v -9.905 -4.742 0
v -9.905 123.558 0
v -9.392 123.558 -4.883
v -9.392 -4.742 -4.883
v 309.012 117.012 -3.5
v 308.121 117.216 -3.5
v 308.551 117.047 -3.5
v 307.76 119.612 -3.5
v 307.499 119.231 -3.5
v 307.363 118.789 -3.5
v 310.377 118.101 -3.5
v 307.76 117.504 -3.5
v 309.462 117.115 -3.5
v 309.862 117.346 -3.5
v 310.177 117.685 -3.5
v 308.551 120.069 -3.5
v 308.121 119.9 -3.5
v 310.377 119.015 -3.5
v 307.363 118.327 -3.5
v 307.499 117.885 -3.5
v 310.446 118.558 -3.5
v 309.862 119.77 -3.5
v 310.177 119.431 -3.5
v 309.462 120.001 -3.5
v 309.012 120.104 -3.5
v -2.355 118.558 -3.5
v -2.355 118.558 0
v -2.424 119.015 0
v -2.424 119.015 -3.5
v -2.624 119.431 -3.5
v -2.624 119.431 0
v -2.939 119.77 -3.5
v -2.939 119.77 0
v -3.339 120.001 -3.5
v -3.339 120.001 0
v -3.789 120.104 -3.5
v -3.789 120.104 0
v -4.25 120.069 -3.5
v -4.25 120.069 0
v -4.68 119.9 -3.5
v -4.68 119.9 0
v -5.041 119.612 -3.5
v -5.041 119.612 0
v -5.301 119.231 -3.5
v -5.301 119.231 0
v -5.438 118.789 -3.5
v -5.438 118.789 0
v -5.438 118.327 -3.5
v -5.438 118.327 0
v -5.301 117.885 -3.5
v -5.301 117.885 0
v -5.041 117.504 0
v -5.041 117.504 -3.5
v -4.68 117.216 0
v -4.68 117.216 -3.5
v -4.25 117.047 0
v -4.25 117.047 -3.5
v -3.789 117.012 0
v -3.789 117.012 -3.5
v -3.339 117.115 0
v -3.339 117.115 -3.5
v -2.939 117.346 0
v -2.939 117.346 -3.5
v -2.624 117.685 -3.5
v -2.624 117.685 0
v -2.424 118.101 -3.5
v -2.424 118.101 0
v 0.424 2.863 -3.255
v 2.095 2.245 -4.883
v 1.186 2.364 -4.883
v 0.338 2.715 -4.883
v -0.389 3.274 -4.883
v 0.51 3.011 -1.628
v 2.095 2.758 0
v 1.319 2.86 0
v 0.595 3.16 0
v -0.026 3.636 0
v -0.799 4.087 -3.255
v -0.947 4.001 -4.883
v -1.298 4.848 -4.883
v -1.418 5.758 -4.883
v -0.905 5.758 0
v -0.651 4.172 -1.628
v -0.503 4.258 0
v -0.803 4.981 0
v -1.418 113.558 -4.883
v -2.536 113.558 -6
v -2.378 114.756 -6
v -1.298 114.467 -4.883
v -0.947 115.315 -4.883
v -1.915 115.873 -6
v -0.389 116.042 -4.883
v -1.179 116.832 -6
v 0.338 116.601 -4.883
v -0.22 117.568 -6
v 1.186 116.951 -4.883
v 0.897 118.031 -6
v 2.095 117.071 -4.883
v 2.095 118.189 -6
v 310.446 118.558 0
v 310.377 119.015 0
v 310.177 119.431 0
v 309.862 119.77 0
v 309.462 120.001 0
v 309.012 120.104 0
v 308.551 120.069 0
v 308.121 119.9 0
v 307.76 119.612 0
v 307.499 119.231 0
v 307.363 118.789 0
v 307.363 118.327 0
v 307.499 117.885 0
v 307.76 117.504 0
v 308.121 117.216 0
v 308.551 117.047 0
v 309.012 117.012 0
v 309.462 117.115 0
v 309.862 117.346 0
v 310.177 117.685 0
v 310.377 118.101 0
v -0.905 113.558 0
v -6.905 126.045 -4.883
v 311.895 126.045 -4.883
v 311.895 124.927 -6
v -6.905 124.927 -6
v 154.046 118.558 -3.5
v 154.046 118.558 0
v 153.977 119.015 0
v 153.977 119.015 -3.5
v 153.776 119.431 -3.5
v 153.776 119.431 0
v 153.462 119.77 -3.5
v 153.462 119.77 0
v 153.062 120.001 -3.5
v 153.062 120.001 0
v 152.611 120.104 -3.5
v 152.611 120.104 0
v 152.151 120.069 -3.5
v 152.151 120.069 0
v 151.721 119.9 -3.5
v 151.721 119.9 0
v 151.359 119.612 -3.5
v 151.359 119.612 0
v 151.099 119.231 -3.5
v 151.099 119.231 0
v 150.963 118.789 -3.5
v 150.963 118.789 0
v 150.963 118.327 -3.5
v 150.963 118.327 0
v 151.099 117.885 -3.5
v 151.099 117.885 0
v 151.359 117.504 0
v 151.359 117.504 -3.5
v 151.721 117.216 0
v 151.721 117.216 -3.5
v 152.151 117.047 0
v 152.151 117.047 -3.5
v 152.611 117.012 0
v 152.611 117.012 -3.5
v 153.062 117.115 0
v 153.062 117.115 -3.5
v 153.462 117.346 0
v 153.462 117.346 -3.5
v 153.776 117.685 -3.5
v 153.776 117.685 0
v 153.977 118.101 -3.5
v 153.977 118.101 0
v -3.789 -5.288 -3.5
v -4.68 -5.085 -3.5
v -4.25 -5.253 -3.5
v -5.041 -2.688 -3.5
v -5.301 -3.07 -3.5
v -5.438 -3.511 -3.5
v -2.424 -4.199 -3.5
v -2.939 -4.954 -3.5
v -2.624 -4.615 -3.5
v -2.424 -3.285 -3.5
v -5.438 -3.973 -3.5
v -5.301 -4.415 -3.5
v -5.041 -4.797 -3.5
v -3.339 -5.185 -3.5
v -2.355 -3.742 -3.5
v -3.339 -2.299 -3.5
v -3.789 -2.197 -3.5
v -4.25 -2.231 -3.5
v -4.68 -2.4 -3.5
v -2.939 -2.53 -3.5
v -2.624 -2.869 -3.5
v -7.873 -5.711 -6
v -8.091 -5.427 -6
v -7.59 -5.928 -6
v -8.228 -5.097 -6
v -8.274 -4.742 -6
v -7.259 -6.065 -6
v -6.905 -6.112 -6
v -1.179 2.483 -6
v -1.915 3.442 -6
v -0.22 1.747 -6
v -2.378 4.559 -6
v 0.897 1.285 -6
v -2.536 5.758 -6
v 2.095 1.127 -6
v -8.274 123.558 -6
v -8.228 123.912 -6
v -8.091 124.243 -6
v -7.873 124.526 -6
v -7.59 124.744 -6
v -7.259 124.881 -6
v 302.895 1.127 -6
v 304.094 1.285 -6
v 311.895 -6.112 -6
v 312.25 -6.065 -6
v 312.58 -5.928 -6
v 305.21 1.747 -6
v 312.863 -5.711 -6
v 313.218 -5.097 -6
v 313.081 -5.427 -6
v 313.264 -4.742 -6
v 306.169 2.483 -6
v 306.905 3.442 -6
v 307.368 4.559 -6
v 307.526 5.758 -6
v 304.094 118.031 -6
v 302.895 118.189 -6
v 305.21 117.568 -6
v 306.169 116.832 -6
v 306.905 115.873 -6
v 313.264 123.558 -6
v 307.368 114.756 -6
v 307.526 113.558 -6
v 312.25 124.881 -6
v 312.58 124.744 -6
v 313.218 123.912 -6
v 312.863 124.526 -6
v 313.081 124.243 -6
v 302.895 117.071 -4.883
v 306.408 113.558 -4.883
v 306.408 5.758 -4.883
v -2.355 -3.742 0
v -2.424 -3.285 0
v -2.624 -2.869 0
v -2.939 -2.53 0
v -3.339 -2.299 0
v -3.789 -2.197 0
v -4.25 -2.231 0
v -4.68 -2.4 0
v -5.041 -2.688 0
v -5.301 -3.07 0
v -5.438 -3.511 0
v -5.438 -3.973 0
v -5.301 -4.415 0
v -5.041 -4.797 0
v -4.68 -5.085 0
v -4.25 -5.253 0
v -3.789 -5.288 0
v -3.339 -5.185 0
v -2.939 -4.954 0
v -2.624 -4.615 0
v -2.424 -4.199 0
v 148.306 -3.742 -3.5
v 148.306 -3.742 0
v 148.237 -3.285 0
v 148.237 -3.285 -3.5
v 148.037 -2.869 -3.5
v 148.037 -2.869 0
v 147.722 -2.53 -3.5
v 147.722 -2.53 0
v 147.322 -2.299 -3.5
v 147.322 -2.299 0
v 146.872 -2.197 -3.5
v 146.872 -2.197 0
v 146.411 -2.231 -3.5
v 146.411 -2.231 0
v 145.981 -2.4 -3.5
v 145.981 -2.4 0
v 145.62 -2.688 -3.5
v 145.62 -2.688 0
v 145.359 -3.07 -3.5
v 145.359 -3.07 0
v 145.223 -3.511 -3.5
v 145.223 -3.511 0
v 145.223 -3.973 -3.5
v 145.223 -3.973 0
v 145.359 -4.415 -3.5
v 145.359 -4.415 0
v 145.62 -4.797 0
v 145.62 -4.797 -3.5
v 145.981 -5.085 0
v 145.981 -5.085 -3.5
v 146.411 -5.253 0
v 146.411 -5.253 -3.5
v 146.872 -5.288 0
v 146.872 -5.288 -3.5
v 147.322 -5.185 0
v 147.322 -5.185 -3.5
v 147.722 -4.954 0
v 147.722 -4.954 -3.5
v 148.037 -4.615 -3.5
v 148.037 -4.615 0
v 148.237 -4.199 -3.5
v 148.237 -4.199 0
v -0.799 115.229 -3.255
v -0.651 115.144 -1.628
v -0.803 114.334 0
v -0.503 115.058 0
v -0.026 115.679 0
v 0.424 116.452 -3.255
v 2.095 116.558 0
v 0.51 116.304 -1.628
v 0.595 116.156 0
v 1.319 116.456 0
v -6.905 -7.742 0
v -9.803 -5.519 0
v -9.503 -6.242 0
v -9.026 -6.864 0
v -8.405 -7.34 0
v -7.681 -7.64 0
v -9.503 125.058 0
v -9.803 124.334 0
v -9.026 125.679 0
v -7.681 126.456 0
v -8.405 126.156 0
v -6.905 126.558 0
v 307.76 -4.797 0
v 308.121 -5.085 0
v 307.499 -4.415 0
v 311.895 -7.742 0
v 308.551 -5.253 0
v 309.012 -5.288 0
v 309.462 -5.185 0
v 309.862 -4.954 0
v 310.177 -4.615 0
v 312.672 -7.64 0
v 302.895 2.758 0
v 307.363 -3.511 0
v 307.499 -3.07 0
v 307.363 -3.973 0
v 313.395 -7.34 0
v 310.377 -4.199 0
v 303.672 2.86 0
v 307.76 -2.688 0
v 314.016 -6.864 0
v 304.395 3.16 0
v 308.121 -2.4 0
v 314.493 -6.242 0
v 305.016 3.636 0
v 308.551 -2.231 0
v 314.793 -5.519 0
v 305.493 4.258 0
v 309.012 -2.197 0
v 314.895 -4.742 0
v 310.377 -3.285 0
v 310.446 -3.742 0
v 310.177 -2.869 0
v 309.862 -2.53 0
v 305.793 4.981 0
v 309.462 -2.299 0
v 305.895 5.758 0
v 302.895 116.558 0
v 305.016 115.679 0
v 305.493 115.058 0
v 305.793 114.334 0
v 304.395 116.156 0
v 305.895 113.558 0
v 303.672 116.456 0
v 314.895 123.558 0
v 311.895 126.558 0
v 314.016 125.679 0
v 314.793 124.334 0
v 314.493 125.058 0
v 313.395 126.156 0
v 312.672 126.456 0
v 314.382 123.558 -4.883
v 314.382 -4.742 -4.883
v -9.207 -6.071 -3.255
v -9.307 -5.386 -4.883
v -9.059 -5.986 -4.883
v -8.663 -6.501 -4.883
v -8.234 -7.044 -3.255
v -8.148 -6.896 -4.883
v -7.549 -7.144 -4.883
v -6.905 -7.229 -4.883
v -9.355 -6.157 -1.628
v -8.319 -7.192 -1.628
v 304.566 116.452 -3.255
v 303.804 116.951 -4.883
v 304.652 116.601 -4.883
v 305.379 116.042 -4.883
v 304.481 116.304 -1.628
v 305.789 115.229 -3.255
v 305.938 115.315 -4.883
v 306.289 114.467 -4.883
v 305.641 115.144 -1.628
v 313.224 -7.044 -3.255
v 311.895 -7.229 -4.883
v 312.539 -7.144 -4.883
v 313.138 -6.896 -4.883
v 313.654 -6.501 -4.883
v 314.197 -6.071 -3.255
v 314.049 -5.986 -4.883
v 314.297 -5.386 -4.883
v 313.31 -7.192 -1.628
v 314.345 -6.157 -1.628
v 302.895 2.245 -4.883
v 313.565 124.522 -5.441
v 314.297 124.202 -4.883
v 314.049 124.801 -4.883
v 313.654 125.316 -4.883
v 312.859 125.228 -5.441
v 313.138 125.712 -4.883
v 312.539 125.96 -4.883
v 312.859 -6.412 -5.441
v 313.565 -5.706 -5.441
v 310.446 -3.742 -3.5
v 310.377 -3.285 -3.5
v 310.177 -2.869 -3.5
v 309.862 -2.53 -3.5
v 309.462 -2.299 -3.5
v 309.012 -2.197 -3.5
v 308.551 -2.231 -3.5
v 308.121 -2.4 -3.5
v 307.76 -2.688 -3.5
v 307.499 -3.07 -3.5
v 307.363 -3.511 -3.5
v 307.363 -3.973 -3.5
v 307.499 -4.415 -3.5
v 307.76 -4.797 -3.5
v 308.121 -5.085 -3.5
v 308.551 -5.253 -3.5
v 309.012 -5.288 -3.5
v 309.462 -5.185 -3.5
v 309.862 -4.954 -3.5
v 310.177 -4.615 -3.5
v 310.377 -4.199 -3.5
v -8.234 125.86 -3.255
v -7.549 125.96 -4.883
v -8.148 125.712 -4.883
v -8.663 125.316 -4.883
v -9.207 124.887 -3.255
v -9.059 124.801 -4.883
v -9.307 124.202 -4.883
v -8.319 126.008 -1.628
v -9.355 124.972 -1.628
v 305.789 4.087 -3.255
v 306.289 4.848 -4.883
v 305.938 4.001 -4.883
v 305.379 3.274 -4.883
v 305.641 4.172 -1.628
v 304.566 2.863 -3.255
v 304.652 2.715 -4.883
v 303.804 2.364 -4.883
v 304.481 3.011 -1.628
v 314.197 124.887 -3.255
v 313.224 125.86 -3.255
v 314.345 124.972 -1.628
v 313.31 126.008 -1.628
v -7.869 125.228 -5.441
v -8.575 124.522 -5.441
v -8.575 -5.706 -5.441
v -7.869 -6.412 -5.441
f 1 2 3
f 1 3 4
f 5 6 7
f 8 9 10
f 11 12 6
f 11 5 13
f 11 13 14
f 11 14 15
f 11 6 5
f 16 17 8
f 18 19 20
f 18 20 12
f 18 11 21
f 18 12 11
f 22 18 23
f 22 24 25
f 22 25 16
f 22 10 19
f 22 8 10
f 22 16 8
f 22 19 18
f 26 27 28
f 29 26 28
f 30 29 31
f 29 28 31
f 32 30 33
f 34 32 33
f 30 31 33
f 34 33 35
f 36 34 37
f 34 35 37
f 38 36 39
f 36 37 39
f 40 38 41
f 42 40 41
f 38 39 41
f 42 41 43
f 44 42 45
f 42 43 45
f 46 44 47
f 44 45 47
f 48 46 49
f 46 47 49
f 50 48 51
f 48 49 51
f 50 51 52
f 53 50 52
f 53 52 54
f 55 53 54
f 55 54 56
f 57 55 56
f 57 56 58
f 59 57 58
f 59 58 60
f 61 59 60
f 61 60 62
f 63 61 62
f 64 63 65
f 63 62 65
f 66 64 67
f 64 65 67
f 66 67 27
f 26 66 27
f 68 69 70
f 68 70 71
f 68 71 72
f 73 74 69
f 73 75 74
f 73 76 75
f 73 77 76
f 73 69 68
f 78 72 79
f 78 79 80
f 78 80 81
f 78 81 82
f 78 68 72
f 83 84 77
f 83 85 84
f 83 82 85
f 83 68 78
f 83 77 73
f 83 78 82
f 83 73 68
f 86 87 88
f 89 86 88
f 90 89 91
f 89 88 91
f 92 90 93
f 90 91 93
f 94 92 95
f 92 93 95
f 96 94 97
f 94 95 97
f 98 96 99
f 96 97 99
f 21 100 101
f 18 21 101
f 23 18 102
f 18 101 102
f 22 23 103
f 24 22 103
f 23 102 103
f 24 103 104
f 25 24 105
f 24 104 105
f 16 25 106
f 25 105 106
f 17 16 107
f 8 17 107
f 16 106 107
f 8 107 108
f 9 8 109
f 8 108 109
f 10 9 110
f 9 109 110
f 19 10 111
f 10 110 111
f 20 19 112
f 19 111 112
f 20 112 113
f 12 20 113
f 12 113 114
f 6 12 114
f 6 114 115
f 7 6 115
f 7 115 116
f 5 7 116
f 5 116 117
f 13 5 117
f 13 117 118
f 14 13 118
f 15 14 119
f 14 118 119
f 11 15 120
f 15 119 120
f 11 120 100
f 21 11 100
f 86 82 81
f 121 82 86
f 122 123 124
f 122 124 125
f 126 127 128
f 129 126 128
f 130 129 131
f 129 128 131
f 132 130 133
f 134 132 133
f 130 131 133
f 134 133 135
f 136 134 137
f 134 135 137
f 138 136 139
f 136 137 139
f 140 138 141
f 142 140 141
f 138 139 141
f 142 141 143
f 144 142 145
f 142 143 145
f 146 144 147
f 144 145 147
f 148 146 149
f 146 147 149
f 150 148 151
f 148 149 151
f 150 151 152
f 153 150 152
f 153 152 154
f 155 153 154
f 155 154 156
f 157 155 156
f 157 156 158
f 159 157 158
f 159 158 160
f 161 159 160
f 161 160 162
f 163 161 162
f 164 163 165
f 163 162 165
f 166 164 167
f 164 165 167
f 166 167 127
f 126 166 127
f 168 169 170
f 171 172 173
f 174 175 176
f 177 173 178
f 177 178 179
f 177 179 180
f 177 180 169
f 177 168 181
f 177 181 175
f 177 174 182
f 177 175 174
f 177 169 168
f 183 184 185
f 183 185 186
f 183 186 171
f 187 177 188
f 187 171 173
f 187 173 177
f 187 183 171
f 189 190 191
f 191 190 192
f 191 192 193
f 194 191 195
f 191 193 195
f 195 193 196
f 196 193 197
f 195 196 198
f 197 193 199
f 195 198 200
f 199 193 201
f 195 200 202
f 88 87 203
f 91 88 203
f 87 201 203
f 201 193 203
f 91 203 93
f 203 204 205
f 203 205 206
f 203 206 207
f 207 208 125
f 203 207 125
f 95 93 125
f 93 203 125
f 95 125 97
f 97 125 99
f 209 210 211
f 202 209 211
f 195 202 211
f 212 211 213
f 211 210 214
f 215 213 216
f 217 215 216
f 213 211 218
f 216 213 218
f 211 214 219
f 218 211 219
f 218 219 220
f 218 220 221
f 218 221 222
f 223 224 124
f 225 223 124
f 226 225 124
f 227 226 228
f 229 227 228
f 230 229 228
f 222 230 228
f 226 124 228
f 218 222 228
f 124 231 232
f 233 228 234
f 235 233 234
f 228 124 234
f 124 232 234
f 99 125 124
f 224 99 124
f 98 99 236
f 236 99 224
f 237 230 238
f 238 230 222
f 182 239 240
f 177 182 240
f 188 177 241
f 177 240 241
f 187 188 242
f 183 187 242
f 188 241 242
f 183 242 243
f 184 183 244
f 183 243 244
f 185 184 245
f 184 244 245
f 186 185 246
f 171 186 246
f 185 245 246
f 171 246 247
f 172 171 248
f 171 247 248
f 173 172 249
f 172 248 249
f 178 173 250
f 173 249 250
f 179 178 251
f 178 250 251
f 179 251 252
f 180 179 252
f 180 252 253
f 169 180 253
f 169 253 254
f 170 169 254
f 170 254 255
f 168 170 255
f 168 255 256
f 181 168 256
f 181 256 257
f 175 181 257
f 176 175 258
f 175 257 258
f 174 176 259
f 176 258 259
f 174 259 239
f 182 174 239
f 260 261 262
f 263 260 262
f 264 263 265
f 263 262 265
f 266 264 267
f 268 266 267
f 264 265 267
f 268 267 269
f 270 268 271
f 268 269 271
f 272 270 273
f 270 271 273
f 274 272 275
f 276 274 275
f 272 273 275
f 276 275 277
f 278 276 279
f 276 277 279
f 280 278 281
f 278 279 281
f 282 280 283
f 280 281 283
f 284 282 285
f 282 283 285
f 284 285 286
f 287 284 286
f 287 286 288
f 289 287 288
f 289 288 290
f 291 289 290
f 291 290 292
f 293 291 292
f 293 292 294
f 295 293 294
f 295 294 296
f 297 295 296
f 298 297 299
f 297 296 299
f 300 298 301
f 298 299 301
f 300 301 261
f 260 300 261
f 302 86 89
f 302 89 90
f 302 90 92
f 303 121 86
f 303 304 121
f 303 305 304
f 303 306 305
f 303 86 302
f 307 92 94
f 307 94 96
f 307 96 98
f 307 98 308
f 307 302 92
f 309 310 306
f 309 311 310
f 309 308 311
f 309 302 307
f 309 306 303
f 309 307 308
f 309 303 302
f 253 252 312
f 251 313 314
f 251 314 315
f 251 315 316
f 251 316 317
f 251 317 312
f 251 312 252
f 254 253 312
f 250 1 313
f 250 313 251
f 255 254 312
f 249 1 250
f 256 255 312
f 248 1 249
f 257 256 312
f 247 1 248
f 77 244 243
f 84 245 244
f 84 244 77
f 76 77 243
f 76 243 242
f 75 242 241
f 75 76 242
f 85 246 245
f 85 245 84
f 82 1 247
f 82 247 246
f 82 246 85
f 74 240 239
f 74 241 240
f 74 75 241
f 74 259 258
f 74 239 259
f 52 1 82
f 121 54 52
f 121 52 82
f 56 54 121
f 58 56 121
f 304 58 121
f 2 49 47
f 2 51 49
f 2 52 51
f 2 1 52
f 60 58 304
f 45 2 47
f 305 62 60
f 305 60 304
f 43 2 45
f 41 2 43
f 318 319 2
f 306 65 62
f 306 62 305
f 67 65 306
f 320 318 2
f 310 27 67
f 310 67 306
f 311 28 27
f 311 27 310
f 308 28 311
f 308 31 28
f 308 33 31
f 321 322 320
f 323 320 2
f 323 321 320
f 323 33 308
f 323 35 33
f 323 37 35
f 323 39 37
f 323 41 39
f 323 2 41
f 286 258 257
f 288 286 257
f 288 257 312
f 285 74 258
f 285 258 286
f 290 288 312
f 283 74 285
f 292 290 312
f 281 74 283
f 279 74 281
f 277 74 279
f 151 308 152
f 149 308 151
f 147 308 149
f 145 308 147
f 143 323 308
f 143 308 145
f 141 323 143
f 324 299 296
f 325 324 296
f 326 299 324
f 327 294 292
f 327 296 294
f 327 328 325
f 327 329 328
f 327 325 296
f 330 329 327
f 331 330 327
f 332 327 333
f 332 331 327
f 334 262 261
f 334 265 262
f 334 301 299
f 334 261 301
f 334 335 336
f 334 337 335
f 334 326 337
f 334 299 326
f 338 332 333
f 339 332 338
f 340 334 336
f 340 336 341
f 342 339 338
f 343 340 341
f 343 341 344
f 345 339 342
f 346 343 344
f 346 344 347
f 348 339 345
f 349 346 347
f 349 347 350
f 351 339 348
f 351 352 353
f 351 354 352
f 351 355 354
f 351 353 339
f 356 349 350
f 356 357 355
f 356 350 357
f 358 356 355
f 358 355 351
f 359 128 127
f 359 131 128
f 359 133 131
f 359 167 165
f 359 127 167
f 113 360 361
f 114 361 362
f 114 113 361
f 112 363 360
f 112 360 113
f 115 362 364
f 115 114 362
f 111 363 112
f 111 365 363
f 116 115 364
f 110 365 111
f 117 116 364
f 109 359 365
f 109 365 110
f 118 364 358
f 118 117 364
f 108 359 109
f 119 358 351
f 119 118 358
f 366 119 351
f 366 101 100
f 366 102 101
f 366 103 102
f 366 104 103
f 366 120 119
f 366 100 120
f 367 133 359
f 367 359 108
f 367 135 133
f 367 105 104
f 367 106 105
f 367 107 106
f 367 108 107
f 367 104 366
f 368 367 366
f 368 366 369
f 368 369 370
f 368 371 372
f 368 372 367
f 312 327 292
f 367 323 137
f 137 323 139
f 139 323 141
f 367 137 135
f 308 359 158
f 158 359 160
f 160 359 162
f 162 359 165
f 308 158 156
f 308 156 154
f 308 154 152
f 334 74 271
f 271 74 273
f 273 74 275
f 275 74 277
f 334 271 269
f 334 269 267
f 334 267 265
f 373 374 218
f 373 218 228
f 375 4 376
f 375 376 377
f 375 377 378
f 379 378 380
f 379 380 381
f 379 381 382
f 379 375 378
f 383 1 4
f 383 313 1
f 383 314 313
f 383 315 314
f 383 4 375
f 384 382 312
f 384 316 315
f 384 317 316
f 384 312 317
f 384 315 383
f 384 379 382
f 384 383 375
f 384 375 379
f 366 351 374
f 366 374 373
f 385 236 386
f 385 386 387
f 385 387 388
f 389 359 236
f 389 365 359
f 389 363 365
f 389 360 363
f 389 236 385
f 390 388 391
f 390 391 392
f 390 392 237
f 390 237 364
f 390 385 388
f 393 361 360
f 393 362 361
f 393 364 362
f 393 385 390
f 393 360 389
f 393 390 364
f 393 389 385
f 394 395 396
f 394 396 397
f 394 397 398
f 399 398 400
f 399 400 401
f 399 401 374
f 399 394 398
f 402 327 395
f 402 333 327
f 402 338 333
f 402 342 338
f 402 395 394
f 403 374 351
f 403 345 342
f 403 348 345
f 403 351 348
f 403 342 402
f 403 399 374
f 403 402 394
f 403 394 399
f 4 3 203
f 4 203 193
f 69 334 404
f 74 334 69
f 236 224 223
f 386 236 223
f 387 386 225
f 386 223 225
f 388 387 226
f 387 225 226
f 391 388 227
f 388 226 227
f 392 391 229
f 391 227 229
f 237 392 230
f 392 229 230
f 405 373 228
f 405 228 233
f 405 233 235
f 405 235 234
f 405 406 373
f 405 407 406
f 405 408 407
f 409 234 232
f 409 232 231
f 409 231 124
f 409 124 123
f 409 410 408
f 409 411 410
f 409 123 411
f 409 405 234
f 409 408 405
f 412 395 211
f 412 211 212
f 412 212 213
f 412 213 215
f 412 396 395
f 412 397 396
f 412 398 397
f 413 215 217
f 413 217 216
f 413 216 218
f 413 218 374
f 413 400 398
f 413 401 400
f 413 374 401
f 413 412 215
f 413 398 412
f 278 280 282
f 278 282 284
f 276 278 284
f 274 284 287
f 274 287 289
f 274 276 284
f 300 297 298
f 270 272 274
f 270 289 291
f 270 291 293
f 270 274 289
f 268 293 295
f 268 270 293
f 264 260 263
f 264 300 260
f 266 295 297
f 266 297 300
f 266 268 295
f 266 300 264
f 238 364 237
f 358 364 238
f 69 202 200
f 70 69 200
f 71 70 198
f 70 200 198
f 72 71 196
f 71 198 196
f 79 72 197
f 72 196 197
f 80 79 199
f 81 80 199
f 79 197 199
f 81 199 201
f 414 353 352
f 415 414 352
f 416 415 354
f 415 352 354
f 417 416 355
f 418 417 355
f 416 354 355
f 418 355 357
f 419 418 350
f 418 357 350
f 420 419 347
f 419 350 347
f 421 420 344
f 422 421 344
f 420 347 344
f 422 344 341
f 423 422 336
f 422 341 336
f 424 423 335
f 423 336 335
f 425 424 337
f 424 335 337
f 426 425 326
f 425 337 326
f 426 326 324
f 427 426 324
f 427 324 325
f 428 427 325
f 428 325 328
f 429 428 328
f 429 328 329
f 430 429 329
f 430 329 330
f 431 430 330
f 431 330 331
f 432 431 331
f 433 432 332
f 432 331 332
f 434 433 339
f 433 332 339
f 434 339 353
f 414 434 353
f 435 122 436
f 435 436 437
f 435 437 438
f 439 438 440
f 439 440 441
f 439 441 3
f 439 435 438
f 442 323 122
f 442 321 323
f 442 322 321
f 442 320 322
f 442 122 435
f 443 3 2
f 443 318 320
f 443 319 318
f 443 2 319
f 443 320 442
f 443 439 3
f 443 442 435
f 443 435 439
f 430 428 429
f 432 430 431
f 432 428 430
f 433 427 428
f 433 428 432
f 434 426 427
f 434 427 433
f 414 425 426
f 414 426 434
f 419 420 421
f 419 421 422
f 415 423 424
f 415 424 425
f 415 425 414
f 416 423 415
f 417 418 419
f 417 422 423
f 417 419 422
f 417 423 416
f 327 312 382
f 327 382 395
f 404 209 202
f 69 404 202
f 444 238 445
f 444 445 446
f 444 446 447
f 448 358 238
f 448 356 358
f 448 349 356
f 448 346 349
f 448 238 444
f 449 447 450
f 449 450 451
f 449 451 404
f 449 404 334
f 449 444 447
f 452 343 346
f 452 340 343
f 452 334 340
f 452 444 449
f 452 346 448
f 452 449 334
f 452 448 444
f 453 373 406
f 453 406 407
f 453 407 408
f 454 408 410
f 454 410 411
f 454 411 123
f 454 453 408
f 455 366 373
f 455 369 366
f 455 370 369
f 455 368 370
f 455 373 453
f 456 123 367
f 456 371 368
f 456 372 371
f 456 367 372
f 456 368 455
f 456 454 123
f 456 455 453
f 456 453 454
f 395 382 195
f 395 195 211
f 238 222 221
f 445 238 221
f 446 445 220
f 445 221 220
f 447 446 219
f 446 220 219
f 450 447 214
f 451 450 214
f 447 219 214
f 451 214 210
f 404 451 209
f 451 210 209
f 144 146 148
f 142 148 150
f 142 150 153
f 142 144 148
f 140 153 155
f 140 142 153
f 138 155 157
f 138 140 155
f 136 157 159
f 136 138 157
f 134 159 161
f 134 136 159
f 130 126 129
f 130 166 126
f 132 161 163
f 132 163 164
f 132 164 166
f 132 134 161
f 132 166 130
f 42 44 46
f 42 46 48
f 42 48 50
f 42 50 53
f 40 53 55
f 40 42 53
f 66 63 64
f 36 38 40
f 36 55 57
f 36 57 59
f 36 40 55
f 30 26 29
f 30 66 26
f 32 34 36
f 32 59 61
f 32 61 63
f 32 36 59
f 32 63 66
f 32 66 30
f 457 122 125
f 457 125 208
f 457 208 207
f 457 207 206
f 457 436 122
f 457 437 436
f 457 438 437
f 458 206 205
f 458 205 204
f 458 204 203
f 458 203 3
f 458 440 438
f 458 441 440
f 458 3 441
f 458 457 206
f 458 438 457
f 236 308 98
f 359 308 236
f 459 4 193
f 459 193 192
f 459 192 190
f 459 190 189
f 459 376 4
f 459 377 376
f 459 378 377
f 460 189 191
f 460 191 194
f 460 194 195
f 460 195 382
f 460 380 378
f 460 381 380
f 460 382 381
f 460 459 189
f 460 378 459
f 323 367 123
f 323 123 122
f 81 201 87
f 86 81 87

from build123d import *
from OCP.BRepFilletAPI import BRepFilletAPI_MakeChamfer

# Parameters (mm, degrees)
EXTRUDE_1_DEPTH     = 6
EXTRUDE_1_DRAFT     = -6
CHAMFER_2_SIZE      = 1.123603797
CHAMFER_2_SIZE_2    = 1
SKETCH_3_3_R        = 1.55
CUT_EXTRUDE_1_DEPTH = 3.5
CHAMFER_3_SIZE      = 1
CHAMFER_3_SIZE_2    = 1.123603797


with BuildPart() as part:
    # 草图3 → 凸台-拉伸1 (with draft: the straight prism first)
    with BuildSketch(Plane.XY):
        with BuildLine():
            Line((-9.9049154, 123.558), (-9.9049154, -4.742307))
            ThreePointArc((-9.9049154, -4.742307), (-9.026235744, -6.863627344), (-6.9049154, -7.742307))
            Line((-6.9049154, -7.742307), (311.8950846, -7.742307))
            ThreePointArc((311.8950846, -7.742307), (314.016404944, -6.863627344), (314.8950846, -4.742307))
            Line((314.8950846, -4.742307), (314.8950846, 123.558))
            ThreePointArc((314.8950846, 123.558), (314.016404944, 125.679320344), (311.8950846, 126.558))
            Line((311.8950846, 126.558), (-6.9049154, 126.558))
            ThreePointArc((-6.9049154, 126.558), (-9.026235744, 125.679320344), (-9.9049154, 123.558))
        make_face()
        with BuildLine():
            Line((2.0950846, 116.558), (302.8950846, 116.558))
            ThreePointArc((302.8950846, 116.558), (305.016404944, 115.679320344), (305.8950846, 113.558))
            Line((305.8950846, 113.558), (305.8950846, 5.757693))
            ThreePointArc((305.8950846, 5.757693), (305.016404944, 3.636372656), (302.8950846, 2.757693))
            Line((302.8950846, 2.757693), (2.0950846, 2.757693))
            ThreePointArc((2.0950846, 2.757693), (-0.026235744, 3.636372656), (-0.9049154, 5.757693))
            Line((-0.9049154, 5.757693), (-0.9049154, 113.558))
            ThreePointArc((-0.9049154, 113.558), (-0.026235744, 115.679320344), (2.0950846, 116.558))
        make_face(mode=Mode.SUBTRACT)
    extrude(amount=-EXTRUDE_1_DEPTH)
    # 凸台-拉伸1: the draft: its side faces are tilted about the plane it starts from
    extrude_1_sides = [part.faces().sort_by_distance(p)[0] for p in [
        (152.4950846, 126.558, -3),
        (-9.026235744, 125.679320344, -3),
        (-9.9049154, 59.4078465, -3),
        (-9.026235744, -6.863627344, -3),
        (152.4950846, -7.742307, -3),
        (314.016404944, -6.863627344, -3),
        (314.8950846, 59.4078465, -3),
        (314.016404944, 125.679320344, -3),
        (-0.026235744, 115.679320344, -3),
        (152.4950846, 116.558, -3),
        (305.016404944, 115.679320344, -3),
        (305.8950846, 59.6578465, -3),
        (305.016404944, 3.636372656, -3),
        (152.4950846, 2.757693, -3),
        (-0.026235744, 3.636372656, -3),
        (-0.9049154, 59.6578465, -3),
    ]]
    draft(extrude_1_sides, Plane.XY, EXTRUDE_1_DRAFT)

    # 倒角2
    chamfer_2_edges_1 = [part.edges().sort_by_distance(p)[0] for p in [
        (-0.472155248, 116.125239848, -6),
    ]]
    chamfer_2_side_1 = [part.faces().sort_by_distance(p)[0] for p in [
        (-0.470676993, 116.123761593, -5.980109562),
    ]]
    chamfer_2_edges_2 = [part.edges().sort_by_distance(p)[0] for p in [
        (152.4950846, 117.188625412, -6),
    ]]
    chamfer_2_side_2 = [part.faces().sort_by_distance(p)[0] for p in [
        (152.4950846, 117.186534842, -5.980109562),
    ]]
    chamfer_2_edges_3 = [part.edges().sort_by_distance(p)[0] for p in [
        (305.462324448, 116.125239848, -6),
    ]]
    chamfer_2_side_3 = [part.faces().sort_by_distance(p)[0] for p in [
        (305.460846193, 116.123761593, -5.980109562),
    ]]
    chamfer_2_edges_4 = [part.edges().sort_by_distance(p)[0] for p in [
        (306.525710012, 59.6578465, -6),
    ]]
    chamfer_2_side_4 = [part.faces().sort_by_distance(p)[0] for p in [
        (306.523619442, 59.6578465, -5.980109562),
    ]]
    chamfer_2_edges_5 = [part.edges().sort_by_distance(p)[0] for p in [
        (305.462324448, 3.190453152, -6),
    ]]
    chamfer_2_side_5 = [part.faces().sort_by_distance(p)[0] for p in [
        (305.460846193, 3.191931407, -5.980109562),
    ]]
    chamfer_2_edges_6 = [part.edges().sort_by_distance(p)[0] for p in [
        (152.4950846, 2.127067588, -6),
    ]]
    chamfer_2_side_6 = [part.faces().sort_by_distance(p)[0] for p in [
        (152.4950846, 2.129158158, -5.980109562),
    ]]
    chamfer_2_edges_7 = [part.edges().sort_by_distance(p)[0] for p in [
        (-0.472155248, 3.190453152, -6),
    ]]
    chamfer_2_side_7 = [part.faces().sort_by_distance(p)[0] for p in [
        (-0.470676993, 3.191931407, -5.980109562),
    ]]
    chamfer_2_edges_8 = [part.edges().sort_by_distance(p)[0] for p in [
        (-1.535540812, 59.6578465, -6),
    ]]
    chamfer_2_side_8 = [part.faces().sort_by_distance(p)[0] for p in [
        (-1.533450242, 59.6578465, -5.980109562),
    ]]
    chamfer_2 = BRepFilletAPI_MakeChamfer(part.part.solid().wrapped)
    for e in chamfer_2_edges_1:
        chamfer_2.Add(CHAMFER_2_SIZE, CHAMFER_2_SIZE_2, e.wrapped, chamfer_2_side_1[0].wrapped)
    for e in chamfer_2_edges_2:
        chamfer_2.Add(CHAMFER_2_SIZE, CHAMFER_2_SIZE_2, e.wrapped, chamfer_2_side_2[0].wrapped)
    for e in chamfer_2_edges_3:
        chamfer_2.Add(CHAMFER_2_SIZE, CHAMFER_2_SIZE_2, e.wrapped, chamfer_2_side_3[0].wrapped)
    for e in chamfer_2_edges_4:
        chamfer_2.Add(CHAMFER_2_SIZE, CHAMFER_2_SIZE_2, e.wrapped, chamfer_2_side_4[0].wrapped)
    for e in chamfer_2_edges_5:
        chamfer_2.Add(CHAMFER_2_SIZE, CHAMFER_2_SIZE_2, e.wrapped, chamfer_2_side_5[0].wrapped)
    for e in chamfer_2_edges_6:
        chamfer_2.Add(CHAMFER_2_SIZE, CHAMFER_2_SIZE_2, e.wrapped, chamfer_2_side_6[0].wrapped)
    for e in chamfer_2_edges_7:
        chamfer_2.Add(CHAMFER_2_SIZE_2, CHAMFER_2_SIZE, e.wrapped, chamfer_2_side_7[0].wrapped)
    for e in chamfer_2_edges_8:
        chamfer_2.Add(CHAMFER_2_SIZE, CHAMFER_2_SIZE_2, e.wrapped, chamfer_2_side_8[0].wrapped)
    add(Compound.cast(chamfer_2.Shape()), mode=Mode.REPLACE)

    # 草图3<3> → 切除-拉伸1 (cut)
    with BuildSketch(Plane.XY):
        with Locations((-3.9049154, -3.742307)):
            Circle(SKETCH_3_3_R)
        with Locations((-3.9049154, 118.558)):
            Circle(SKETCH_3_3_R)
        with Locations((152.4955423, 118.558)):
            Circle(SKETCH_3_3_R)
        with Locations((308.896, 118.558)):
            Circle(SKETCH_3_3_R)
        with Locations((308.896, -3.742307)):
            Circle(SKETCH_3_3_R)
        with Locations((146.756, -3.742307)):
            Circle(SKETCH_3_3_R)
    extrude(amount=-CUT_EXTRUDE_1_DEPTH, mode=Mode.SUBTRACT)

    # 倒角3
    chamfer_3_edges_1 = [part.edges().sort_by_distance(p)[0] for p in [
        (152.4950846, 125.927374588, -6),
    ]]
    chamfer_3_side_1 = [part.faces().sort_by_distance(p)[0] for p in [
        (152.4950846, 125.907374588, -6),
    ]]
    chamfer_3_edges_2 = [part.edges().sort_by_distance(p)[0] for p in [
        (-8.580316239, 125.233400839, -6),
    ]]
    chamfer_3_side_2 = [part.faces().sort_by_distance(p)[0] for p in [
        (-8.566174103, 125.219258703, -6),
    ]]
    chamfer_3_edges_3 = [part.edges().sort_by_distance(p)[0] for p in [
        (-9.274289988, 59.4078465, -6),
    ]]
    chamfer_3_side_3 = [part.faces().sort_by_distance(p)[0] for p in [
        (-9.254289988, 59.4078465, -6),
    ]]
    chamfer_3_edges_4 = [part.edges().sort_by_distance(p)[0] for p in [
        (-8.580316239, -6.417707839, -6),
    ]]
    chamfer_3_side_4 = [part.faces().sort_by_distance(p)[0] for p in [
        (-8.566174103, -6.403565703, -6),
    ]]
    chamfer_3_edges_5 = [part.edges().sort_by_distance(p)[0] for p in [
        (152.4950846, -7.111681588, -6),
    ]]
    chamfer_3_side_5 = [part.faces().sort_by_distance(p)[0] for p in [
        (152.4950846, -7.091681588, -6),
    ]]
    chamfer_3_edges_6 = [part.edges().sort_by_distance(p)[0] for p in [
        (313.570485439, -6.417707839, -6),
    ]]
    chamfer_3_side_6 = [part.faces().sort_by_distance(p)[0] for p in [
        (313.556343303, -6.403565703, -6),
    ]]
    chamfer_3_edges_7 = [part.edges().sort_by_distance(p)[0] for p in [
        (314.264459188, 59.4078465, -6),
    ]]
    chamfer_3_side_7 = [part.faces().sort_by_distance(p)[0] for p in [
        (314.244459188, 59.4078465, -6),
    ]]
    chamfer_3_edges_8 = [part.edges().sort_by_distance(p)[0] for p in [
        (313.570485439, 125.233400839, -6),
    ]]
    chamfer_3_side_8 = [part.faces().sort_by_distance(p)[0] for p in [
        (313.556343303, 125.219258703, -6),
    ]]
    chamfer_3 = BRepFilletAPI_MakeChamfer(part.part.solid().wrapped)
    for e in chamfer_3_edges_1:
        chamfer_3.Add(CHAMFER_3_SIZE, CHAMFER_3_SIZE_2, e.wrapped, chamfer_3_side_1[0].wrapped)
    for e in chamfer_3_edges_2:
        chamfer_3.Add(CHAMFER_3_SIZE_2, CHAMFER_3_SIZE, e.wrapped, chamfer_3_side_2[0].wrapped)
    for e in chamfer_3_edges_3:
        chamfer_3.Add(CHAMFER_3_SIZE, CHAMFER_3_SIZE_2, e.wrapped, chamfer_3_side_3[0].wrapped)
    for e in chamfer_3_edges_4:
        chamfer_3.Add(CHAMFER_3_SIZE, CHAMFER_3_SIZE_2, e.wrapped, chamfer_3_side_4[0].wrapped)
    for e in chamfer_3_edges_5:
        chamfer_3.Add(CHAMFER_3_SIZE, CHAMFER_3_SIZE_2, e.wrapped, chamfer_3_side_5[0].wrapped)
    for e in chamfer_3_edges_6:
        chamfer_3.Add(CHAMFER_3_SIZE, CHAMFER_3_SIZE_2, e.wrapped, chamfer_3_side_6[0].wrapped)
    for e in chamfer_3_edges_7:
        chamfer_3.Add(CHAMFER_3_SIZE, CHAMFER_3_SIZE_2, e.wrapped, chamfer_3_side_7[0].wrapped)
    for e in chamfer_3_edges_8:
        chamfer_3.Add(CHAMFER_3_SIZE, CHAMFER_3_SIZE_2, e.wrapped, chamfer_3_side_8[0].wrapped)
    add(Compound.cast(chamfer_3.Shape()), mode=Mode.REPLACE)


solid = part.part
